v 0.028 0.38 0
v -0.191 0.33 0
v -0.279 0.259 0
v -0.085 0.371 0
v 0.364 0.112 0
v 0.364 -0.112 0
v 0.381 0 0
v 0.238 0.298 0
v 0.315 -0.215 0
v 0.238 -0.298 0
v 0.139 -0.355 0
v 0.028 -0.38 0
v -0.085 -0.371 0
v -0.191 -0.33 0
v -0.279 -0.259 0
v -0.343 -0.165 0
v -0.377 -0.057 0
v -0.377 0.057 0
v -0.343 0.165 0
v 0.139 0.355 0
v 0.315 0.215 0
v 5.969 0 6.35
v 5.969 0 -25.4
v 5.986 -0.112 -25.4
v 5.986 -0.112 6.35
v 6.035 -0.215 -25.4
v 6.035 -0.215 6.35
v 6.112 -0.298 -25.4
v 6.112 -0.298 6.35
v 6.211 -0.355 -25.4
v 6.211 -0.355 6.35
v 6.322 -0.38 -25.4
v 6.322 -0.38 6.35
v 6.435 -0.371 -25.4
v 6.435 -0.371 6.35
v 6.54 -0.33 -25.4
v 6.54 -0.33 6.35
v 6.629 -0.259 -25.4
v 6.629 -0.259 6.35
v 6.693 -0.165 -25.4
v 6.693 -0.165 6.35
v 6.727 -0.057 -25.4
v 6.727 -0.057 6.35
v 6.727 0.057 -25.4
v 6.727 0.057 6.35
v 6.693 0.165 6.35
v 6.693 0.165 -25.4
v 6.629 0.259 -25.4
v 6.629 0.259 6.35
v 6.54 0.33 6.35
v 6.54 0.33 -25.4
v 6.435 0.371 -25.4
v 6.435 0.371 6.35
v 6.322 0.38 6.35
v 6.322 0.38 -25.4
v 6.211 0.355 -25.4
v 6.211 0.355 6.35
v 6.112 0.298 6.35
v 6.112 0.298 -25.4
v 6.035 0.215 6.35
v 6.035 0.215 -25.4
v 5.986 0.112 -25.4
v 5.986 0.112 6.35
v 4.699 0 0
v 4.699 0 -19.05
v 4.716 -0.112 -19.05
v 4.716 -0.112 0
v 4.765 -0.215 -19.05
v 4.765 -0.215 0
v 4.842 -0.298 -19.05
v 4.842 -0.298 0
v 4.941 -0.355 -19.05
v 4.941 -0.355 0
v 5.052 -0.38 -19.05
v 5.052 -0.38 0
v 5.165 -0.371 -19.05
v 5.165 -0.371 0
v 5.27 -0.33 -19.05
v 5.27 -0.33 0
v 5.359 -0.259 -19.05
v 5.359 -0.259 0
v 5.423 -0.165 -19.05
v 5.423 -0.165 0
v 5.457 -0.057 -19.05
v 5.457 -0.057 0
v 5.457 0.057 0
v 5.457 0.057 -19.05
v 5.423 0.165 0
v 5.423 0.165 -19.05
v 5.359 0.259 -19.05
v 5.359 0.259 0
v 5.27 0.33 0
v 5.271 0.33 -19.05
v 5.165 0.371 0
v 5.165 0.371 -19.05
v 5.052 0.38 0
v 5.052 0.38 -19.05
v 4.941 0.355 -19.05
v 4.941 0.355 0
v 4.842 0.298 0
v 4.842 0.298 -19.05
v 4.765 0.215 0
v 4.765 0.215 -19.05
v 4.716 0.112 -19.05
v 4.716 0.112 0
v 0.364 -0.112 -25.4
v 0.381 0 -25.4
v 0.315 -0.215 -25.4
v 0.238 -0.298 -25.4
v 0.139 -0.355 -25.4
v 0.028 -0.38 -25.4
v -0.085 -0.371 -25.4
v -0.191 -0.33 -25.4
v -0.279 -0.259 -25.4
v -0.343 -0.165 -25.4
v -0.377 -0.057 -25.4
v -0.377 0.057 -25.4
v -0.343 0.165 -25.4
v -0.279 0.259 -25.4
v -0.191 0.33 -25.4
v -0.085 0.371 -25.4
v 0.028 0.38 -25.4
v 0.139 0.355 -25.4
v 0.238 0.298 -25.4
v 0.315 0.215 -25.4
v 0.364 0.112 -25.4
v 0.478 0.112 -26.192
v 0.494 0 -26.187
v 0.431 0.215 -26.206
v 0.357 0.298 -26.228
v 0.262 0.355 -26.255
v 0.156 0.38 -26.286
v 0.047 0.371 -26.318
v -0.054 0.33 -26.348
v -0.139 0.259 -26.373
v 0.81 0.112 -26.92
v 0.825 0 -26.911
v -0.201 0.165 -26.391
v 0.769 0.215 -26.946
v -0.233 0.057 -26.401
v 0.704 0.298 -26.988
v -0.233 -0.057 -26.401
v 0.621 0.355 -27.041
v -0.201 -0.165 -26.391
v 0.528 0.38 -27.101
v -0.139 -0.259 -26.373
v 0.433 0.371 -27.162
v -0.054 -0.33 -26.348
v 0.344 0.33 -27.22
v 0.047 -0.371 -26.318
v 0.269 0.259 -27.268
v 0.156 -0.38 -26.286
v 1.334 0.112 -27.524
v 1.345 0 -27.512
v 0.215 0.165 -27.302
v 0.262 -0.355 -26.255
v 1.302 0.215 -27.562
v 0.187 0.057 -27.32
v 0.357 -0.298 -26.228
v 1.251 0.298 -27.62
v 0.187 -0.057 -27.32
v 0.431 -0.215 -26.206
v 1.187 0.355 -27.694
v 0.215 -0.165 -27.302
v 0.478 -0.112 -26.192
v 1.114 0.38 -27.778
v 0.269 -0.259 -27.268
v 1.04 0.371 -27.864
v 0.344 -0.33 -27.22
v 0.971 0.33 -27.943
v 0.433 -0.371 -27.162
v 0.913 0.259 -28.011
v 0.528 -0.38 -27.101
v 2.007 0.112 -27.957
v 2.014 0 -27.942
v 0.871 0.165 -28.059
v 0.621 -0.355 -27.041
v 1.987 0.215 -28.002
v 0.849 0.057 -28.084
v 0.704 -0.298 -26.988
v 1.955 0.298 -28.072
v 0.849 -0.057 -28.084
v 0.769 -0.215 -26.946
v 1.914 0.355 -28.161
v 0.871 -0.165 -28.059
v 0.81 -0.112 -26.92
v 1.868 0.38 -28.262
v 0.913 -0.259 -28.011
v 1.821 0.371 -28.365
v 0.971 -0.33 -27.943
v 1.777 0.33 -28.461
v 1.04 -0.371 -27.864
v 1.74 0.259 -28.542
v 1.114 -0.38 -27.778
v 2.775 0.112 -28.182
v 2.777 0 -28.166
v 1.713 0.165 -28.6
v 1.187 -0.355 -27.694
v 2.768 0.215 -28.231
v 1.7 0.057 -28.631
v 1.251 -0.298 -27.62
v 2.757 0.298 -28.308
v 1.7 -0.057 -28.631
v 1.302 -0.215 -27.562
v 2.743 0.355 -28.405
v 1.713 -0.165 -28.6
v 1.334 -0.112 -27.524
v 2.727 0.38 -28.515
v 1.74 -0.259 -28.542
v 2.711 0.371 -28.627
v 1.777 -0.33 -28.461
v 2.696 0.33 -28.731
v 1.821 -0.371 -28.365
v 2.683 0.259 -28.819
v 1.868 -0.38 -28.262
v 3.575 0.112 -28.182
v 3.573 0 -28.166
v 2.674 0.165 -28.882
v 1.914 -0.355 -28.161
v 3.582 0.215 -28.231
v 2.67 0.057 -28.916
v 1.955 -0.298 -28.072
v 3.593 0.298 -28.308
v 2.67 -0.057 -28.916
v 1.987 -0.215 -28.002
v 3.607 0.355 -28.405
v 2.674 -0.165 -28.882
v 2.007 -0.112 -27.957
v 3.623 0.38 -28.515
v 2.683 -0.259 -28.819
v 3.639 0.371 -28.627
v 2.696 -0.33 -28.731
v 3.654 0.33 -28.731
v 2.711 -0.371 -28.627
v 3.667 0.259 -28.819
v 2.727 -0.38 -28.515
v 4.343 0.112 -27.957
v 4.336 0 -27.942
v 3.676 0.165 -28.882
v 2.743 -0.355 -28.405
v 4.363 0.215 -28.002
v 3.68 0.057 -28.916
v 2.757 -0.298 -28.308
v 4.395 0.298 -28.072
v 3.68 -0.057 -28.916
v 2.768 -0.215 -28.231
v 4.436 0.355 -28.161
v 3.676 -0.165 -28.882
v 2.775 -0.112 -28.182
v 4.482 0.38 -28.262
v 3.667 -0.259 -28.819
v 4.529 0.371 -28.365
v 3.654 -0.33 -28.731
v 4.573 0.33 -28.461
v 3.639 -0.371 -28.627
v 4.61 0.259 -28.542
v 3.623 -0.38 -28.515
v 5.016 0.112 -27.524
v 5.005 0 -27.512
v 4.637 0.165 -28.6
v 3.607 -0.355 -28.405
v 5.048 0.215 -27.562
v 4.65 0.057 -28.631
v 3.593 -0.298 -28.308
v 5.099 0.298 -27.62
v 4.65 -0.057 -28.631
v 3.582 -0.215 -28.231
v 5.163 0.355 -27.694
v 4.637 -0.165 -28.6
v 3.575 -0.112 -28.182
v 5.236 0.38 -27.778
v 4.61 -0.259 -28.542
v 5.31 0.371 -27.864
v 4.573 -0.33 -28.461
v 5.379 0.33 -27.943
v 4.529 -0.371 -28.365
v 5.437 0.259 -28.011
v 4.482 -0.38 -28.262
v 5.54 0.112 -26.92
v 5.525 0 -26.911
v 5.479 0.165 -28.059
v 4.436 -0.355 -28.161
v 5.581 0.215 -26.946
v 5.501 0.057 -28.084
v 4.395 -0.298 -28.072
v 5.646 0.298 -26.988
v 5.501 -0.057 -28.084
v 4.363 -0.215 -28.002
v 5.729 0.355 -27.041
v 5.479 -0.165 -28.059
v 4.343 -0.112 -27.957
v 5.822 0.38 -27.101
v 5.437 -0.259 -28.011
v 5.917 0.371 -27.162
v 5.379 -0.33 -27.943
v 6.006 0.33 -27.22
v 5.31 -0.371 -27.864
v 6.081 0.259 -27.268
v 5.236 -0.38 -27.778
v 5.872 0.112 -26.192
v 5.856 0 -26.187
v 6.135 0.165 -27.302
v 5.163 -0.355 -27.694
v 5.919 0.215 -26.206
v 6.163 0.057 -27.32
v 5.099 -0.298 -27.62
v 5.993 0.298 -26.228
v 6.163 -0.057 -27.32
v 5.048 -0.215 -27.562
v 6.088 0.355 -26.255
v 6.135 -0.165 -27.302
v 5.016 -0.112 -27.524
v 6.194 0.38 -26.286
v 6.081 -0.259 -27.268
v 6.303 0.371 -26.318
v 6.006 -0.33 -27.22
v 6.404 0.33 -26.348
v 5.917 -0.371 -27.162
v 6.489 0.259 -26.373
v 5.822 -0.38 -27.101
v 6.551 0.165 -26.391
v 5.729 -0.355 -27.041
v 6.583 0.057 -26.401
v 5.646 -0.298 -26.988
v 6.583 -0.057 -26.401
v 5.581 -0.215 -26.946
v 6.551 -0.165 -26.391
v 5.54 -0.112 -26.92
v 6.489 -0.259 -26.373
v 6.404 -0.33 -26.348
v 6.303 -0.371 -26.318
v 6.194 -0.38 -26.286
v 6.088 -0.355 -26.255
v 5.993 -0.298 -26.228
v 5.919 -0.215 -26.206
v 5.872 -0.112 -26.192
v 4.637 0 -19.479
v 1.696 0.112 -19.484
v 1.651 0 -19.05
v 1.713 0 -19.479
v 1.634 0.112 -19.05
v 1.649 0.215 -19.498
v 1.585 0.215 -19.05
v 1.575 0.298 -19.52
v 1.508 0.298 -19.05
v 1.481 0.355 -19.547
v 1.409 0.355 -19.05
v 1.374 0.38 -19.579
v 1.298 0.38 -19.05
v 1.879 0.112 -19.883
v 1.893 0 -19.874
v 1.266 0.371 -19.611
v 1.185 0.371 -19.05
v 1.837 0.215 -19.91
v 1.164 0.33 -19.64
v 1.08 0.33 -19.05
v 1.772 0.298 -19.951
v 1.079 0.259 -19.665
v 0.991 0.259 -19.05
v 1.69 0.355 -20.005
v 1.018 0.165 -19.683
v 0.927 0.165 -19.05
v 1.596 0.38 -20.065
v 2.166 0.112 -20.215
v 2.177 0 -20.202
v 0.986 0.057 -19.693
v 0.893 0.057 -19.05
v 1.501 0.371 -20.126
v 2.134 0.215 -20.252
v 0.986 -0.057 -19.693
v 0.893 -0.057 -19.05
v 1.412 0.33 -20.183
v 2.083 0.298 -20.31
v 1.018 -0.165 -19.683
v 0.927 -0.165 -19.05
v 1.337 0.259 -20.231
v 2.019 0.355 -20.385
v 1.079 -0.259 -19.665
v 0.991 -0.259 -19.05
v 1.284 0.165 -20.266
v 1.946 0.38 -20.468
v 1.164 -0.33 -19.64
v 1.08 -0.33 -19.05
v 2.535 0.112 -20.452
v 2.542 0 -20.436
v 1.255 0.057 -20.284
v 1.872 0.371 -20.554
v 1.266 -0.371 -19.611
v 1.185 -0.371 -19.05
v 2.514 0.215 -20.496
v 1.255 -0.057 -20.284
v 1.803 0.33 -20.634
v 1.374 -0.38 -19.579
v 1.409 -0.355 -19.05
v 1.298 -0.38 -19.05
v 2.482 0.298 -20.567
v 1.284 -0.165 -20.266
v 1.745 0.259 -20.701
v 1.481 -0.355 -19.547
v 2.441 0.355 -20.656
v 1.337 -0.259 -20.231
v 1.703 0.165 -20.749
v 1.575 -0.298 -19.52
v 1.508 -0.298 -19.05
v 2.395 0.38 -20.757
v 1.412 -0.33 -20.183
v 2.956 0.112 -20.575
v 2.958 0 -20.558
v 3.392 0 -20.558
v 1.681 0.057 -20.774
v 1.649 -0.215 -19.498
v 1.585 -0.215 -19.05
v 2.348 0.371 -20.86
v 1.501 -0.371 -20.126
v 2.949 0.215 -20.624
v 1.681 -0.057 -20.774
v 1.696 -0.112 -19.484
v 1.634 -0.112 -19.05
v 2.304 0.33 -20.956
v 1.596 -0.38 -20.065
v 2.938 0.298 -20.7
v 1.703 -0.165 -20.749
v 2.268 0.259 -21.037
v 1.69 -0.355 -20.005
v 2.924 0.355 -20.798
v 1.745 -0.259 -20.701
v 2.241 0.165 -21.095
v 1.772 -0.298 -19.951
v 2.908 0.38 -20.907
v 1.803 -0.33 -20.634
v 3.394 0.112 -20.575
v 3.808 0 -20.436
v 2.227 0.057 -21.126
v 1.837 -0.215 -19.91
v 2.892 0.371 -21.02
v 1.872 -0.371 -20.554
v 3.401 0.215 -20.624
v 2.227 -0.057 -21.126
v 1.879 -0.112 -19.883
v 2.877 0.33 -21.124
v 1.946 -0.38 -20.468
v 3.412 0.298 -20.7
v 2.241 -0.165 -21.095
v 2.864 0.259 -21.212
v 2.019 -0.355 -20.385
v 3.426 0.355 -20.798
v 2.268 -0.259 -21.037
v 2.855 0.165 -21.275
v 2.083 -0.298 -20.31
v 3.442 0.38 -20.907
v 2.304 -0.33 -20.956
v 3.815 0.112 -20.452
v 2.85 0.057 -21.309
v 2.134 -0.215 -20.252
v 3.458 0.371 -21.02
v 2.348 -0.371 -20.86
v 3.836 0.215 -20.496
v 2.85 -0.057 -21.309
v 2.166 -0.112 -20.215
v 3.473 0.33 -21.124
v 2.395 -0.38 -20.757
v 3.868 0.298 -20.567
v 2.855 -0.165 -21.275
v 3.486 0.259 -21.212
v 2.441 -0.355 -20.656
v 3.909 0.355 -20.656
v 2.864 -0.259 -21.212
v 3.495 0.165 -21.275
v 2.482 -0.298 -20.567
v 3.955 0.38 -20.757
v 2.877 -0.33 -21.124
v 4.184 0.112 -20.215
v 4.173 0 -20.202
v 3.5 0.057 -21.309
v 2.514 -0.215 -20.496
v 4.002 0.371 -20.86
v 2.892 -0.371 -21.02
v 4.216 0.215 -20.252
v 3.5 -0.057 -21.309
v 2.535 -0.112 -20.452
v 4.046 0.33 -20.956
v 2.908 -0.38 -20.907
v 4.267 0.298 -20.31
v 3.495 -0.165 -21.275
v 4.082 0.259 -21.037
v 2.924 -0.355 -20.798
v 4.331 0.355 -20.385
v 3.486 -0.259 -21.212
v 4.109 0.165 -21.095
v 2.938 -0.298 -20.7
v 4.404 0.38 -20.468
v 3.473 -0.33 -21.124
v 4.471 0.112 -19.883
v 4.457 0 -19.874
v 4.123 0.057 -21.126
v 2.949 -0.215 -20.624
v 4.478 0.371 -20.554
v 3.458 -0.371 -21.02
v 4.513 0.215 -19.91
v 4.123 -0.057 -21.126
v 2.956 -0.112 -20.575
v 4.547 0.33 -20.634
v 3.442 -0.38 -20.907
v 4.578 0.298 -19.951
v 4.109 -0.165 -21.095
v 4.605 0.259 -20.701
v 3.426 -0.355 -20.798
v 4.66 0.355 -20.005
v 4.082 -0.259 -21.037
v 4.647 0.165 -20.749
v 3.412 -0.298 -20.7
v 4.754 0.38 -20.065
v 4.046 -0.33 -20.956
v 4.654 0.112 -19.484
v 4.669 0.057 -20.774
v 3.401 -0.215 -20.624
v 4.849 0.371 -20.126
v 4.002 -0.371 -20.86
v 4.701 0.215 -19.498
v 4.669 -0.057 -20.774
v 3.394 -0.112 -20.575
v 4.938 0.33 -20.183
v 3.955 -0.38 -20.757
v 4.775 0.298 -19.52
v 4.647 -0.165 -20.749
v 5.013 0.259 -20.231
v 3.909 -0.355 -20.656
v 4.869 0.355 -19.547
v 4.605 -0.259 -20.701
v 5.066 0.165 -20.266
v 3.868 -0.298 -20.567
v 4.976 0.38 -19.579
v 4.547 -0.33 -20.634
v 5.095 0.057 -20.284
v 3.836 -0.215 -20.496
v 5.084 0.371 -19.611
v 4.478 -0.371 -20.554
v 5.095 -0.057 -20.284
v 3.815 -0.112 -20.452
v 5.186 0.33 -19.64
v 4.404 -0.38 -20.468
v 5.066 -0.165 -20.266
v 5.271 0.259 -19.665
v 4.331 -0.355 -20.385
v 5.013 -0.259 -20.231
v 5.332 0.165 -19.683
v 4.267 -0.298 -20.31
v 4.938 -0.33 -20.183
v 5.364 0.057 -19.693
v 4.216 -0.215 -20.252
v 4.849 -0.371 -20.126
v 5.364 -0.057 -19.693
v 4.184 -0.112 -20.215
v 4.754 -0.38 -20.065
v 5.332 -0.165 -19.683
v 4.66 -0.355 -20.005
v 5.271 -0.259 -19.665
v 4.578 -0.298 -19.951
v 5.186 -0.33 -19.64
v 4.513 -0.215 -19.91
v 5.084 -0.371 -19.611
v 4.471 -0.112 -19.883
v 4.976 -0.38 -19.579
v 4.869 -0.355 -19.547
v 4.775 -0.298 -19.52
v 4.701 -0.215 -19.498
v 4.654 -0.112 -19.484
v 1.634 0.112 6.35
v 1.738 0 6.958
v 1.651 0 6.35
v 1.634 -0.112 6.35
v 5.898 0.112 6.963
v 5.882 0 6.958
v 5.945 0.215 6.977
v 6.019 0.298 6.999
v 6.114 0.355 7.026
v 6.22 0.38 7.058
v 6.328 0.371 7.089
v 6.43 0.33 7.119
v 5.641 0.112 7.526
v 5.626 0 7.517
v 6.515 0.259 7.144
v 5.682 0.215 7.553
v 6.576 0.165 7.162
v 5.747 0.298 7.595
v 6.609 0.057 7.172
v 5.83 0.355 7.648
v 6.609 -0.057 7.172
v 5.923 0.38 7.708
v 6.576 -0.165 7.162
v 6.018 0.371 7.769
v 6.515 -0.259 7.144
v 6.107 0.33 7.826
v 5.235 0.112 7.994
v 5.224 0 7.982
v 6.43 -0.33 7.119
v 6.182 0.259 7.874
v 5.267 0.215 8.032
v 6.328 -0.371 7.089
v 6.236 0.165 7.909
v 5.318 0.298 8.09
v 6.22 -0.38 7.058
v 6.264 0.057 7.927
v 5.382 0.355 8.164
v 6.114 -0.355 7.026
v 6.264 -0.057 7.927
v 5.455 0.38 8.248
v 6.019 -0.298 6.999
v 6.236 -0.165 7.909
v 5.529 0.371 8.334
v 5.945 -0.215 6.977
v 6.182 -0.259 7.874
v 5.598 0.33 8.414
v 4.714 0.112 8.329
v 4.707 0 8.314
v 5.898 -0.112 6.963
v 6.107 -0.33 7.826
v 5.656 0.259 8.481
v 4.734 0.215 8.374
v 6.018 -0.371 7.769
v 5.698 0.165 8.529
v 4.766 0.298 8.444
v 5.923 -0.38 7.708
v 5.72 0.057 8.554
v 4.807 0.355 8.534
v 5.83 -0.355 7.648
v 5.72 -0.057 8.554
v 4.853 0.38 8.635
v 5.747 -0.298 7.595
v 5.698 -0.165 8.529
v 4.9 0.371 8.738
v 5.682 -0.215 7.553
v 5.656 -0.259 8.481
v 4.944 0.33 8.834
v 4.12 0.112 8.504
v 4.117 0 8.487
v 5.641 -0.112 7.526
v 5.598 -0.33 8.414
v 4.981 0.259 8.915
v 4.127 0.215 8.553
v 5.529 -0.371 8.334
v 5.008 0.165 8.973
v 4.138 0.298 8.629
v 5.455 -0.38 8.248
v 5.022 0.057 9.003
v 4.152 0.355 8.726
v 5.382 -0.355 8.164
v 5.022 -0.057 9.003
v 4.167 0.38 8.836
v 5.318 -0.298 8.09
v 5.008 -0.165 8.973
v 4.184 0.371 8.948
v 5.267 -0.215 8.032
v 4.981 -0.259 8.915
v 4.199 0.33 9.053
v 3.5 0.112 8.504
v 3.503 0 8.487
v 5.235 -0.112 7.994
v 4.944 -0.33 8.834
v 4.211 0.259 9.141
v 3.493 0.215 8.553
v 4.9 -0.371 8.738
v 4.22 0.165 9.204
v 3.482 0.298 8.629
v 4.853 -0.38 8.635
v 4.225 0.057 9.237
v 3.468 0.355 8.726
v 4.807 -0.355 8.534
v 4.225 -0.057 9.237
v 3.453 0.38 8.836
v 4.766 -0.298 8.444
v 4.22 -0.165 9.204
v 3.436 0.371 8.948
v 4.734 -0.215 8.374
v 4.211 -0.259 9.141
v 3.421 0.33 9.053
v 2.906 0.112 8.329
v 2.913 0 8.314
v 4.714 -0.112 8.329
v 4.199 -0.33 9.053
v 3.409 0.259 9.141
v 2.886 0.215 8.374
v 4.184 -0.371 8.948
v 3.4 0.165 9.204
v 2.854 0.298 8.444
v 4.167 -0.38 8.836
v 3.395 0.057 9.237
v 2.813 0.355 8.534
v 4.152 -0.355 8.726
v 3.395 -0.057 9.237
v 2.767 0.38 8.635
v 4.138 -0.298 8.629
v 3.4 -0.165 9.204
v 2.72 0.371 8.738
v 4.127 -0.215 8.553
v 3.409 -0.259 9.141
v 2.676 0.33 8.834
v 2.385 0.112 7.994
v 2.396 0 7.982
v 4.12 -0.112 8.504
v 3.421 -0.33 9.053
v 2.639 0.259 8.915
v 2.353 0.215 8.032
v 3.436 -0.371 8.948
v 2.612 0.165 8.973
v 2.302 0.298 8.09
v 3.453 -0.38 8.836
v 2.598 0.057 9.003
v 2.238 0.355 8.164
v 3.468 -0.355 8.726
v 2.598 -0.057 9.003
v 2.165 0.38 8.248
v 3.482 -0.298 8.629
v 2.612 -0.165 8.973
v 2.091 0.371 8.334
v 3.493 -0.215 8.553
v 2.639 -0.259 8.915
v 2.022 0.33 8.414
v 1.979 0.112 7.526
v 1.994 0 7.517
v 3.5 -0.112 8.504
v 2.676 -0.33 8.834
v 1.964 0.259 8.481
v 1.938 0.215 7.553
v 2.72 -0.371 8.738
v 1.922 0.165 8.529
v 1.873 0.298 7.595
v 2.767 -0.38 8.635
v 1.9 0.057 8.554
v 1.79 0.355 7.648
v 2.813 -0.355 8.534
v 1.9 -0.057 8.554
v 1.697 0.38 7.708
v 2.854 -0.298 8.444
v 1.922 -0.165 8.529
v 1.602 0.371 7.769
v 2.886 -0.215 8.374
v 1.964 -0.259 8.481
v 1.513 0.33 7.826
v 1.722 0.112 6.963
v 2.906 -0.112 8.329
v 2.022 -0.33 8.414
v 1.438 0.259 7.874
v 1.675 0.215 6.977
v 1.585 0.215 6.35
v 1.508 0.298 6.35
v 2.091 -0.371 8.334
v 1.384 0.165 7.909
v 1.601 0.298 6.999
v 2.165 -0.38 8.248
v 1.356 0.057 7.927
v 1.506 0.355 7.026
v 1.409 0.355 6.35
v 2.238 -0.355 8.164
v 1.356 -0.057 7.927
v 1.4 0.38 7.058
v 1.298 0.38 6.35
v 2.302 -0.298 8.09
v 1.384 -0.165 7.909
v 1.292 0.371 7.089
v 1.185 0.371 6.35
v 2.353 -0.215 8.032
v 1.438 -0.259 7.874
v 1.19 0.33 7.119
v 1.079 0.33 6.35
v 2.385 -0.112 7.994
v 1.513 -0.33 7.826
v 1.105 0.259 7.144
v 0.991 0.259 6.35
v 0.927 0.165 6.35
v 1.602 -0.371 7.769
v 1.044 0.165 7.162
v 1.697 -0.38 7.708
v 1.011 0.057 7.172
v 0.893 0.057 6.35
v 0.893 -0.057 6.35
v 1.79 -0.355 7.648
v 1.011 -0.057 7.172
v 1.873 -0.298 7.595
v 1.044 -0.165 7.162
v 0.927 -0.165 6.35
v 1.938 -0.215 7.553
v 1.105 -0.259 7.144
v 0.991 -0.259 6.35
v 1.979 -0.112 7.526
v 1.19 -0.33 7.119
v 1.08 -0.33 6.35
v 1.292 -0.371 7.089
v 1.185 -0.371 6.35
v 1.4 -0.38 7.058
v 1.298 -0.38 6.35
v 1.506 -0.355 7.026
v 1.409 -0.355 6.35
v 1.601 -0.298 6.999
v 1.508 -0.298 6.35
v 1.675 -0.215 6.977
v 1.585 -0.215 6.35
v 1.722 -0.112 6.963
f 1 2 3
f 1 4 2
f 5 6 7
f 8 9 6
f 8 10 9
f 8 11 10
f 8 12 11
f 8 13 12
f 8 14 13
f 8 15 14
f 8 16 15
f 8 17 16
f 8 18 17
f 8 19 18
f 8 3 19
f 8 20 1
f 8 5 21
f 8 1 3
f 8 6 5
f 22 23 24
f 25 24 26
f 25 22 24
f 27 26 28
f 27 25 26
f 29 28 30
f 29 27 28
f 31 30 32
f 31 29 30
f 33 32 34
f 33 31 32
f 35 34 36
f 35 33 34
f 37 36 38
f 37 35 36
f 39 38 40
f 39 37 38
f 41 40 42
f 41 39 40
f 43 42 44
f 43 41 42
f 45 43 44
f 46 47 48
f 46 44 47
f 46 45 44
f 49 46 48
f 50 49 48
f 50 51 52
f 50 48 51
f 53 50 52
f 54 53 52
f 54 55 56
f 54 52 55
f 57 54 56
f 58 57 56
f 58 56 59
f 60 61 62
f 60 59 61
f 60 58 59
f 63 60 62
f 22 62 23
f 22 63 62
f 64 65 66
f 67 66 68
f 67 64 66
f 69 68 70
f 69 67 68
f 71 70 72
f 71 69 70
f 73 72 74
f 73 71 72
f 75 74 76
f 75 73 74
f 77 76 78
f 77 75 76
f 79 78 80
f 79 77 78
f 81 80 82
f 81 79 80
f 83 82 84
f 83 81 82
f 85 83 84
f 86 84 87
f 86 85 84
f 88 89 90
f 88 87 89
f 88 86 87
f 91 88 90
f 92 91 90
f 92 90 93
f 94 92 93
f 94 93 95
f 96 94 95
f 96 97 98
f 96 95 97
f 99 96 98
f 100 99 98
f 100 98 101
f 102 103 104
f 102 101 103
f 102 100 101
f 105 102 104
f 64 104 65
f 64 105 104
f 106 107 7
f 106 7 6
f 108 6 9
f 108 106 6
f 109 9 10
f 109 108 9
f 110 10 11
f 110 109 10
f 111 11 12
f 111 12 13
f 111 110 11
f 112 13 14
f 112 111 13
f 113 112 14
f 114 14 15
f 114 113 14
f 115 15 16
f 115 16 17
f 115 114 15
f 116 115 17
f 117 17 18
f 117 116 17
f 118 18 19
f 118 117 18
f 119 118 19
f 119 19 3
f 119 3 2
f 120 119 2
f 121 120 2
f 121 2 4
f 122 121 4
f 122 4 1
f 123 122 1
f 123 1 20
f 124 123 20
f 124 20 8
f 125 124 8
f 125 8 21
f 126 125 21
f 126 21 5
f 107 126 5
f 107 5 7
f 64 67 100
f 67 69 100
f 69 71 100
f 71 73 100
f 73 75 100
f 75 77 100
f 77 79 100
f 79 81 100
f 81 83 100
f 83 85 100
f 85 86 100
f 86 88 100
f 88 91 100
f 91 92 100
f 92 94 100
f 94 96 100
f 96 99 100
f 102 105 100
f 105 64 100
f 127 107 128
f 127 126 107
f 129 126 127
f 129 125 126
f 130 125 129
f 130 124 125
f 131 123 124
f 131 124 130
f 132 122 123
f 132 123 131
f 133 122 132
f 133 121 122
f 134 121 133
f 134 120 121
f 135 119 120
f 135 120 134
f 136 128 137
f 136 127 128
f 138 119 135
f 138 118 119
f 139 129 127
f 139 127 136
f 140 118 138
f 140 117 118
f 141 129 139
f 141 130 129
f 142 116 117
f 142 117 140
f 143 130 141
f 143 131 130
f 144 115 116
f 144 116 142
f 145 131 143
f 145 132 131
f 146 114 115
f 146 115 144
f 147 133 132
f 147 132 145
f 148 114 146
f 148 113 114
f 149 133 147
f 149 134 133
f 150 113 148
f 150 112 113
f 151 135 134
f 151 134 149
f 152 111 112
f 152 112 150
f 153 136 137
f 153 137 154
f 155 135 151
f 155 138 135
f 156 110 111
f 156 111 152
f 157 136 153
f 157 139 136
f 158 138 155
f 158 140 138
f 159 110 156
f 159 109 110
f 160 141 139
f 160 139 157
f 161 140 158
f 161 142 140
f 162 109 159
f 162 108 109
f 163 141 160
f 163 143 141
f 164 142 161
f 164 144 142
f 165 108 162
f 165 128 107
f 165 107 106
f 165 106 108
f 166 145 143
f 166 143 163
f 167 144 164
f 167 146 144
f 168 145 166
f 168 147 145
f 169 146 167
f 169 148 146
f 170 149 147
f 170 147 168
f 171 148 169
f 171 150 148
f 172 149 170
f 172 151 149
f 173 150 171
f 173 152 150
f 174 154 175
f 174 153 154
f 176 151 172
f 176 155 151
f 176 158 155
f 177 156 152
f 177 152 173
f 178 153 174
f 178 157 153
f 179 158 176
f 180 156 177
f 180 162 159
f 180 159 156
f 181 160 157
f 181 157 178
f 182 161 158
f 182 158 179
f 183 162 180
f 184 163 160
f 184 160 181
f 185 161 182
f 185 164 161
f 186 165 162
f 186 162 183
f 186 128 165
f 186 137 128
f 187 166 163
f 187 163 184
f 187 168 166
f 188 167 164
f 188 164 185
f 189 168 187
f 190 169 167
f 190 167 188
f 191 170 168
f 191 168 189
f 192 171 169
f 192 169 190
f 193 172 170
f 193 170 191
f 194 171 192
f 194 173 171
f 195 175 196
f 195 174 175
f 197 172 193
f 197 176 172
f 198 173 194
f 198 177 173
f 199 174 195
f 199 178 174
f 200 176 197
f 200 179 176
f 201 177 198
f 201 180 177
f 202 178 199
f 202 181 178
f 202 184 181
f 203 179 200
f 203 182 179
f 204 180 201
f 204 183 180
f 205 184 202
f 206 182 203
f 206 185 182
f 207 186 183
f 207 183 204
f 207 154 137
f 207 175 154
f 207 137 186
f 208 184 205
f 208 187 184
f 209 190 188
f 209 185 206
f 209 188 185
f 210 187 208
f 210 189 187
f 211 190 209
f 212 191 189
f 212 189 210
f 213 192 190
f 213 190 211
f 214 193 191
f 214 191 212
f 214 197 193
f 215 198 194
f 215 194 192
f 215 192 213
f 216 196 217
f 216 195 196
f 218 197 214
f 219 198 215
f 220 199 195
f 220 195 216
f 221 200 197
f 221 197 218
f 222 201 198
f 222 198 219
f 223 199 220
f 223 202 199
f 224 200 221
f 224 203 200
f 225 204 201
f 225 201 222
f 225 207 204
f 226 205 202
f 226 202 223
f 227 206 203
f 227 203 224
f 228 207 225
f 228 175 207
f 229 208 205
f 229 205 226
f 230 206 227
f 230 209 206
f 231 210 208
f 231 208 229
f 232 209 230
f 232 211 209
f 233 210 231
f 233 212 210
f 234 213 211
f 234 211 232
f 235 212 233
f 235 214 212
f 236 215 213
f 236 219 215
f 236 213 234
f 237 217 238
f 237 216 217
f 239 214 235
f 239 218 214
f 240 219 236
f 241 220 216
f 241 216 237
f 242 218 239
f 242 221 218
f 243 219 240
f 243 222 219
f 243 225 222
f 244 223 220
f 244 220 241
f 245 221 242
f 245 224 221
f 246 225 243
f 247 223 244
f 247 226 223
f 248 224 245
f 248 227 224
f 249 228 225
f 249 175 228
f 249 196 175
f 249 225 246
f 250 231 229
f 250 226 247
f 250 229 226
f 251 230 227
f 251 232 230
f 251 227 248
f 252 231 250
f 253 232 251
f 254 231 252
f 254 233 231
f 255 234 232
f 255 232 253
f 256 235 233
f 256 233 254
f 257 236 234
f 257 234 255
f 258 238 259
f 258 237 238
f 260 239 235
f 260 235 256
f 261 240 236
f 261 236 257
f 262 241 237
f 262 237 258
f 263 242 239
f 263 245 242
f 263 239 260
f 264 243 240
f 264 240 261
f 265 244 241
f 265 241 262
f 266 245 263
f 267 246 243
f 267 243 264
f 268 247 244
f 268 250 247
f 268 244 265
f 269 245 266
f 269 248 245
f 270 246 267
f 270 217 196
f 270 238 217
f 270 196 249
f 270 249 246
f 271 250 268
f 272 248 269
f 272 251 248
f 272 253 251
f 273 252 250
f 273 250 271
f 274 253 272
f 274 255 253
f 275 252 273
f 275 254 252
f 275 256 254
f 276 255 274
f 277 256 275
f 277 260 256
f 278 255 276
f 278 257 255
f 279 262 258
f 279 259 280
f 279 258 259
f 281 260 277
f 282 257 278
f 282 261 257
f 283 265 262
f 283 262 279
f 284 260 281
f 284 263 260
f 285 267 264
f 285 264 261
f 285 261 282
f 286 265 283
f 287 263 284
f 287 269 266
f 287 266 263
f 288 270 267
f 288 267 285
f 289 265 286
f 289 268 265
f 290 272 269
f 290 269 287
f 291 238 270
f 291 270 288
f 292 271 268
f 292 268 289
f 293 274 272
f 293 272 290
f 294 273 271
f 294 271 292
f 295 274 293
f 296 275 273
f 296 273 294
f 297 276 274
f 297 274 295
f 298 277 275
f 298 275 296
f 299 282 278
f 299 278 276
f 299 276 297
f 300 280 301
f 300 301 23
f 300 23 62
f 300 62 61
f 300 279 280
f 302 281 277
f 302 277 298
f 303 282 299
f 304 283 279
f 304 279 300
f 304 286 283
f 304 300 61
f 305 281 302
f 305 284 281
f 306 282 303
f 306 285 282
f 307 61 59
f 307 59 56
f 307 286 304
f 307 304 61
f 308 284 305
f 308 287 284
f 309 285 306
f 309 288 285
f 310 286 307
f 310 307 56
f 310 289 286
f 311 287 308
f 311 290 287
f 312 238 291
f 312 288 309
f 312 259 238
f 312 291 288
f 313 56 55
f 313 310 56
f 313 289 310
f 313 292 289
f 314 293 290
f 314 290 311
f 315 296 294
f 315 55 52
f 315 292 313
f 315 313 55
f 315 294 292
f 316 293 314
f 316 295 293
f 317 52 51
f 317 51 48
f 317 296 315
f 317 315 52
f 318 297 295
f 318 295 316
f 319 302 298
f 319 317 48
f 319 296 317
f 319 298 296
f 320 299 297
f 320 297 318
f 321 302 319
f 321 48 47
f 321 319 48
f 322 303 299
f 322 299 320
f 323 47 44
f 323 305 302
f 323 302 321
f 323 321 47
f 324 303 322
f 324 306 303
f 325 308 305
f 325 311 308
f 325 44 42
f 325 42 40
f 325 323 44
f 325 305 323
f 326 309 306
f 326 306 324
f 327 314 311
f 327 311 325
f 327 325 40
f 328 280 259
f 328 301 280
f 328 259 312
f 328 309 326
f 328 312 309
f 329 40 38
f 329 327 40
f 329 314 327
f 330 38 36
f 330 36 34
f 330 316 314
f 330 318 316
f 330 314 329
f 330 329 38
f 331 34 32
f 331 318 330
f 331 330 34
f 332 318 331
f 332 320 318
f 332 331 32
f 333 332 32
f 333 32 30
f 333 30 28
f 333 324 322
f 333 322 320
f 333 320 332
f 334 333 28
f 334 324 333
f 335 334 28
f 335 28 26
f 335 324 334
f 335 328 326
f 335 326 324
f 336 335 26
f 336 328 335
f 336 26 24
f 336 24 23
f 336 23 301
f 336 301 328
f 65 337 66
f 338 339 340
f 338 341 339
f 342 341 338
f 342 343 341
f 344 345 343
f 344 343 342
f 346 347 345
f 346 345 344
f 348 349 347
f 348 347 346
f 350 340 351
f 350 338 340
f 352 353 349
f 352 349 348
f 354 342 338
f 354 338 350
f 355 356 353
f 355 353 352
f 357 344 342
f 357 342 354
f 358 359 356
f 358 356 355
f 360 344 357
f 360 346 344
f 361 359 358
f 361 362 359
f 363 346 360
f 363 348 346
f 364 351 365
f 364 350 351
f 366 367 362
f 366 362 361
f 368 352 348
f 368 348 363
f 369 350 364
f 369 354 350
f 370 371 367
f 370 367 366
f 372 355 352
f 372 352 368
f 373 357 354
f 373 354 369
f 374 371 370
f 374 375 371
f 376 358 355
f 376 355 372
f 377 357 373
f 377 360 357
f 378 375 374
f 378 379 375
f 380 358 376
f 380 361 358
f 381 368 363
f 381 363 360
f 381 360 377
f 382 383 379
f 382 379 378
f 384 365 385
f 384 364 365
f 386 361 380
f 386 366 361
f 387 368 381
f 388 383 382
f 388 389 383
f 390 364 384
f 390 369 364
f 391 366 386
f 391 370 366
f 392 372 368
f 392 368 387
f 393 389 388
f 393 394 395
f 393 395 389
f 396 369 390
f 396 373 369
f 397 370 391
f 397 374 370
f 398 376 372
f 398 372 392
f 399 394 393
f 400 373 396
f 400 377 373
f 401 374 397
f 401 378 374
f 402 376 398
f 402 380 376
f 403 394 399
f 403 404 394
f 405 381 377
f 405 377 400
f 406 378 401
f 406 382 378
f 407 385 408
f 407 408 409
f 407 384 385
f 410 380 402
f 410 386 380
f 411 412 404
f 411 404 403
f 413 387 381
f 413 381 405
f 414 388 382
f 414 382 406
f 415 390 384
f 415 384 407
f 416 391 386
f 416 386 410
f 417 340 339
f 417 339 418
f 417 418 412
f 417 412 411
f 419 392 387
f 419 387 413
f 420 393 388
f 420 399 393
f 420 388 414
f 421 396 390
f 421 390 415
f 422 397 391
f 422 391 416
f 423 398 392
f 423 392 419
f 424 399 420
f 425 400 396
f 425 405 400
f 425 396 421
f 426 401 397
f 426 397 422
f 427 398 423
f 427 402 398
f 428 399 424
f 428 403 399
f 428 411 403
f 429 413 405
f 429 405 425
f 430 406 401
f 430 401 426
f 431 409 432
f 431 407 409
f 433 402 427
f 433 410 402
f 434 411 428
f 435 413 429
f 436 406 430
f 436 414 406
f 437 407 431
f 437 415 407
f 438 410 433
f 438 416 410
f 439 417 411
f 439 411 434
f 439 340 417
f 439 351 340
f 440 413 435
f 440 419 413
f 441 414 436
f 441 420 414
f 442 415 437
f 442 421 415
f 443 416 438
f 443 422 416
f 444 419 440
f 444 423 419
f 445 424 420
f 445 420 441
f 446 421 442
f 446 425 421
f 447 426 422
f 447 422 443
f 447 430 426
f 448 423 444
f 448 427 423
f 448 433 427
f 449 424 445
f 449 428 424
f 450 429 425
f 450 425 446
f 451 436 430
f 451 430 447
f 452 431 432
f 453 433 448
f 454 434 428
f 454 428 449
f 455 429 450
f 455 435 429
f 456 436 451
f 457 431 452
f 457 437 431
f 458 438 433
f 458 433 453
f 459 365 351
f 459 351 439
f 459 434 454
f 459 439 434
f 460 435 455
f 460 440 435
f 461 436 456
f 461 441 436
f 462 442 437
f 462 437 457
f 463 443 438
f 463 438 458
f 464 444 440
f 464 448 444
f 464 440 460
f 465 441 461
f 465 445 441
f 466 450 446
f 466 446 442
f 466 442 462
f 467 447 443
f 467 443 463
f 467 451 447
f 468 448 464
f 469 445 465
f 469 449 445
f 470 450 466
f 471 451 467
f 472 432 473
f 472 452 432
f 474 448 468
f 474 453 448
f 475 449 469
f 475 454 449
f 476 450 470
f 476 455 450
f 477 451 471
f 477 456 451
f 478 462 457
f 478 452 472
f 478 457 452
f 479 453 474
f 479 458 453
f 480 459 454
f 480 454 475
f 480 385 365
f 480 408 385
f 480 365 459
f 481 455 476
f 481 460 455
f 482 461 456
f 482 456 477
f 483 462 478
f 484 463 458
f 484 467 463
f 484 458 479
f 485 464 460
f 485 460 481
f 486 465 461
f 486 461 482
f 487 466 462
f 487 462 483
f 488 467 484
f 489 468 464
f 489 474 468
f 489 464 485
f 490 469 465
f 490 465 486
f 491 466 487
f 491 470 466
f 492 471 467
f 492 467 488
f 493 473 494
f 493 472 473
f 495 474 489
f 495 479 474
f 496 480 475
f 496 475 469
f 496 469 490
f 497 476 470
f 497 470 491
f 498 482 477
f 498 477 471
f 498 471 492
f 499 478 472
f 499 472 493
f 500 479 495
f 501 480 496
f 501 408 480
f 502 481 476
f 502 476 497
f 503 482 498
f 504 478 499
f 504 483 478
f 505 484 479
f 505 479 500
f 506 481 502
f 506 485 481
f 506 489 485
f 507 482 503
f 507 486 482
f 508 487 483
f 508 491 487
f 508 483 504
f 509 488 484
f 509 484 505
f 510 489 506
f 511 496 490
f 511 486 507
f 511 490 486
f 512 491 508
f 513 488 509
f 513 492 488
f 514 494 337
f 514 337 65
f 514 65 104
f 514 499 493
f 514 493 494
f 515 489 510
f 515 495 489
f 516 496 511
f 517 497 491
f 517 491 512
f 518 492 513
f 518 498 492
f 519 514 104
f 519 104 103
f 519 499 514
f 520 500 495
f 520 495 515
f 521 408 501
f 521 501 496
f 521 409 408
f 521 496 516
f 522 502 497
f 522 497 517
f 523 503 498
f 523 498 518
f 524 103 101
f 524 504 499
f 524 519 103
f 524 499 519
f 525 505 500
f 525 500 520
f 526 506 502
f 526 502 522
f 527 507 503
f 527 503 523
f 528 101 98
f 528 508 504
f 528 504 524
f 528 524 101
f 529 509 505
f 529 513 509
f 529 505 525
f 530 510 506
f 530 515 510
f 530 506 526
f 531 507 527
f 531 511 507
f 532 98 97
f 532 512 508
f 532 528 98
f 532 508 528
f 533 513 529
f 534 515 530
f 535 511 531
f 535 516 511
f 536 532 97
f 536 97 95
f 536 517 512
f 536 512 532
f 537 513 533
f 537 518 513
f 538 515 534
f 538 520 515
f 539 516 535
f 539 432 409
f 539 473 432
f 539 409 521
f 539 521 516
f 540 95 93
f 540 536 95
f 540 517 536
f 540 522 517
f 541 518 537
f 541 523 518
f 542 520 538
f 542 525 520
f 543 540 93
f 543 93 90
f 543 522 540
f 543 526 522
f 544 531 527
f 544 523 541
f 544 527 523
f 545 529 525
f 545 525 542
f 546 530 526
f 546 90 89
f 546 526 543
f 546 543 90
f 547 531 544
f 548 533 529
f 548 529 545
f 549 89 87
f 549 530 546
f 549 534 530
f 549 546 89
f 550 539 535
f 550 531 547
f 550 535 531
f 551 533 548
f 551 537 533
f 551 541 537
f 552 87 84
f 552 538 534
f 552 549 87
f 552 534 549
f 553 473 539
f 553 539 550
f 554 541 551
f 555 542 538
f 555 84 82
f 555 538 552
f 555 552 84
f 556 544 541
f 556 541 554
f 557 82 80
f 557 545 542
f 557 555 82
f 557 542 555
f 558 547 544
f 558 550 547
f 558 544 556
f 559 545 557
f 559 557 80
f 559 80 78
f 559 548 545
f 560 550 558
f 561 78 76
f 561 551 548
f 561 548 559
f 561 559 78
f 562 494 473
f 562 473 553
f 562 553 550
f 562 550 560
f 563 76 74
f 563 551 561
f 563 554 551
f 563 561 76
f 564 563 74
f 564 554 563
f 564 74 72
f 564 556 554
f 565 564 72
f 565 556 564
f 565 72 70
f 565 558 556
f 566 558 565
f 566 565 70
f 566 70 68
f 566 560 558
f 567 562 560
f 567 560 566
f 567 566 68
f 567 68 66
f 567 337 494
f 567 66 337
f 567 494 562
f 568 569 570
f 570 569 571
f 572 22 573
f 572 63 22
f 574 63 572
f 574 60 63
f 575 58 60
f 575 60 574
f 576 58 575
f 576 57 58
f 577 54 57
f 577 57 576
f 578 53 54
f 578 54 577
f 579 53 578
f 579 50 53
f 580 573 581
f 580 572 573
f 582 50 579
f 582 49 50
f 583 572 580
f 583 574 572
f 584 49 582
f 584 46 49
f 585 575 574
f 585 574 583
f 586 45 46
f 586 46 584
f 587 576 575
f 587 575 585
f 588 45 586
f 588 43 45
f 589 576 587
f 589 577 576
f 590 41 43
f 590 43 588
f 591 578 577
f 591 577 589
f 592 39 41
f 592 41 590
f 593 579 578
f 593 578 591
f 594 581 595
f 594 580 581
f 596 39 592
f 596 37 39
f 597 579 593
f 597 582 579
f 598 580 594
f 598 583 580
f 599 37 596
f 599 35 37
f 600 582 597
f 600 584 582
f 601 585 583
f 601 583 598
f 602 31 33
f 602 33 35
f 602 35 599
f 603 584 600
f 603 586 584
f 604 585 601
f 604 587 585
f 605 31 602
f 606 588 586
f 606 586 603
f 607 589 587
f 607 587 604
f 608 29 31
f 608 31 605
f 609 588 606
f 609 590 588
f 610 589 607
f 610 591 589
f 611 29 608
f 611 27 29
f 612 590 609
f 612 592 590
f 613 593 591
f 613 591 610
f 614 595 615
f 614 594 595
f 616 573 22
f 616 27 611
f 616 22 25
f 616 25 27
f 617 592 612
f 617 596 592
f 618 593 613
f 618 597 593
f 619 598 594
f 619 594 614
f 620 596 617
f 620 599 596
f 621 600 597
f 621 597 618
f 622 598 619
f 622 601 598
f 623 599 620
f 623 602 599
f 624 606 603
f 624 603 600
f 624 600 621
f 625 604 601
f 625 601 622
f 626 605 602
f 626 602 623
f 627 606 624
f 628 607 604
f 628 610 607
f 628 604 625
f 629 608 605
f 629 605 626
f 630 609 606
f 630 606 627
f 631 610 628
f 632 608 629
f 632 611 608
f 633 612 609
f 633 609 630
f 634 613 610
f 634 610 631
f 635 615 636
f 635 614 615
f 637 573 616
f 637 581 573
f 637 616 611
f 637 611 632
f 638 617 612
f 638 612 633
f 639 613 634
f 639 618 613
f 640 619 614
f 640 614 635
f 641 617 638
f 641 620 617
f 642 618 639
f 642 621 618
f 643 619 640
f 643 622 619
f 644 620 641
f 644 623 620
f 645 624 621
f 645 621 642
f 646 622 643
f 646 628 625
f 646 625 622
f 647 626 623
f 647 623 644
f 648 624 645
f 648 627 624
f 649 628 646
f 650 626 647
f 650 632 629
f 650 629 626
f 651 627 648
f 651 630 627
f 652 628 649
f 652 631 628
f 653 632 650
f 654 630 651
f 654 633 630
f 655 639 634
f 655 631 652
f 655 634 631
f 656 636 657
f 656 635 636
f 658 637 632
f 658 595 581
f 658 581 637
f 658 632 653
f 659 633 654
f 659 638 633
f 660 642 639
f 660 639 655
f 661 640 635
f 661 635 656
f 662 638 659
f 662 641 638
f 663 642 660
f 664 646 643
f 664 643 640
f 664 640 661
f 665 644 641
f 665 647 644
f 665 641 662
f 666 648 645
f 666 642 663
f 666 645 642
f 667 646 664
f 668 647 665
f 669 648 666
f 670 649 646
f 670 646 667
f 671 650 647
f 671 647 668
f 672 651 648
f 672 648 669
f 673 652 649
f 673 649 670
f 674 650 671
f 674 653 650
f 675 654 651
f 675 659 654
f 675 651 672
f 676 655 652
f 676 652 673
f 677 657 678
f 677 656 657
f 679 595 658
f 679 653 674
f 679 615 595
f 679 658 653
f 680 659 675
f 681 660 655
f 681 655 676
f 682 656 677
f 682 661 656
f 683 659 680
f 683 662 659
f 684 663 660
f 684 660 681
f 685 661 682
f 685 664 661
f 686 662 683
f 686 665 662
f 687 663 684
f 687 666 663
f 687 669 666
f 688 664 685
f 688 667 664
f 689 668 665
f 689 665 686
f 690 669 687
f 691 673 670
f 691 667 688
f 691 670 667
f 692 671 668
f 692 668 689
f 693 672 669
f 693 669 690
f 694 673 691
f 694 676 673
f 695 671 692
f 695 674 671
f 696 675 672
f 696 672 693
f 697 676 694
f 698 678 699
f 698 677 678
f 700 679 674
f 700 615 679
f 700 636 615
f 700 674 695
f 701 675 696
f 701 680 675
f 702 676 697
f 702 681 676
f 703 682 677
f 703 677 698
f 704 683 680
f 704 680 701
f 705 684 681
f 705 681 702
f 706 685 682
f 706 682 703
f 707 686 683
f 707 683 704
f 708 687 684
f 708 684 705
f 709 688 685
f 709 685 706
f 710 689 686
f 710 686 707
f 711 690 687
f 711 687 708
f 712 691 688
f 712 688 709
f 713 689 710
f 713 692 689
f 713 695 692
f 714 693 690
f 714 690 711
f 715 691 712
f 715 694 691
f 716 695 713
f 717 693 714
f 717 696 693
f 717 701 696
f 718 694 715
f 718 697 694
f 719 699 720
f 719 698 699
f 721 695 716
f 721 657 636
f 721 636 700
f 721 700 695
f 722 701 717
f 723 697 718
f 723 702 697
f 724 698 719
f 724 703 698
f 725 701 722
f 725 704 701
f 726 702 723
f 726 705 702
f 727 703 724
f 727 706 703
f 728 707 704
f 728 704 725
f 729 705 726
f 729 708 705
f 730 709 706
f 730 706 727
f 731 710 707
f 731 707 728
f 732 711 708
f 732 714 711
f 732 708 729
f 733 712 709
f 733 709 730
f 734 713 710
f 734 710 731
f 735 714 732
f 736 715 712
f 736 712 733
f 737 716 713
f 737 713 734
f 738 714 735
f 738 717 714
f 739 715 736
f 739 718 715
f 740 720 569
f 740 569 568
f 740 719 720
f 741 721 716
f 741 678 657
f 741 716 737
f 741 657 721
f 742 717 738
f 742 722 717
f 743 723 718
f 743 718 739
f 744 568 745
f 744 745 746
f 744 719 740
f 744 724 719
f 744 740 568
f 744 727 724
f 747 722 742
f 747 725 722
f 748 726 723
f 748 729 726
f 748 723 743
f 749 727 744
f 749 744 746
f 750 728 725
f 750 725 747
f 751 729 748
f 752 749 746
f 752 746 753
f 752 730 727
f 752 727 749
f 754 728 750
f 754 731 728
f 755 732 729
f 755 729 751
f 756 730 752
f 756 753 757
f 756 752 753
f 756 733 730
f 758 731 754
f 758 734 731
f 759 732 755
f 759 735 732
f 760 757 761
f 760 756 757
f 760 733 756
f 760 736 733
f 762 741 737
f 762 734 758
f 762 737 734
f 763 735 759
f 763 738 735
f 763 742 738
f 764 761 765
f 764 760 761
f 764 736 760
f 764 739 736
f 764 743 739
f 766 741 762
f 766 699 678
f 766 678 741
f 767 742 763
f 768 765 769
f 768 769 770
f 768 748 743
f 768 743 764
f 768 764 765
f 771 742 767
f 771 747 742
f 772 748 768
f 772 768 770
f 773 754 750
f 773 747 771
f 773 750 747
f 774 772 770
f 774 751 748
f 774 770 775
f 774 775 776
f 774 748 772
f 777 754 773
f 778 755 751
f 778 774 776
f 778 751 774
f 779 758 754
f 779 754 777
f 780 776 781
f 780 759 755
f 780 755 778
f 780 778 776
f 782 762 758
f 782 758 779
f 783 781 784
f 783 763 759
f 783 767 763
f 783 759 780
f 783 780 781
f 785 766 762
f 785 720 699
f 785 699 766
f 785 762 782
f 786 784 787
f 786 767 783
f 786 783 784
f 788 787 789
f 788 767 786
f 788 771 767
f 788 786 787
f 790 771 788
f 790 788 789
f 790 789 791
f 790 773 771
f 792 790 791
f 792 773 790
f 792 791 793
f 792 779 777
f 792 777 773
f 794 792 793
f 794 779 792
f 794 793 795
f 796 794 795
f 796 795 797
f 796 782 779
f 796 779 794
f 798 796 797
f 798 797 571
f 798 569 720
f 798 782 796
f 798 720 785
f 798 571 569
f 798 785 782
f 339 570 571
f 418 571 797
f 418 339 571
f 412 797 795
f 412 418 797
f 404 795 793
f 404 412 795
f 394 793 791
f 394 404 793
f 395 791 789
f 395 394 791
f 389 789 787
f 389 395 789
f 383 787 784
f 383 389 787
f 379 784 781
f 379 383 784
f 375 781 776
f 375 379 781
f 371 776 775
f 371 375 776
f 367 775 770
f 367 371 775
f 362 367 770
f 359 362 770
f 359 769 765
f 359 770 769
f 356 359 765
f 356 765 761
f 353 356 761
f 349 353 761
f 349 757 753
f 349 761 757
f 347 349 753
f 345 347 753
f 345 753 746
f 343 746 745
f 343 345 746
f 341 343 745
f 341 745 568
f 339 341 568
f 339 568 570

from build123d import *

# Parameters (mm, degrees)
F1_R = 0.381


with BuildPart() as f2:
    # F2: sweep along a path in F0
    with BuildLine(Plane.XZ) as f2_path:
        Line((0, 0), (0, -25.4))
        ThreePointArc((0, -25.4), (3.175, -28.575), (6.35, -25.4))
        Line((6.35, -25.4), (6.35, 6.35))
        ThreePointArc((6.35, 6.35), (3.81, 8.89), (1.27, 6.35))
        Line((1.27, 6.35), (1.27, -19.05))
        ThreePointArc((1.27, -19.05), (3.175, -20.955), (5.08, -19.05))
        Line((5.08, -19.05), (5.08, 0))
    # F1 (on Top) → F2 (sweep)
    with BuildSketch(Plane.XY):
        Circle(F1_R)
    sweep(path=f2_path.line)


solid = f2.part
